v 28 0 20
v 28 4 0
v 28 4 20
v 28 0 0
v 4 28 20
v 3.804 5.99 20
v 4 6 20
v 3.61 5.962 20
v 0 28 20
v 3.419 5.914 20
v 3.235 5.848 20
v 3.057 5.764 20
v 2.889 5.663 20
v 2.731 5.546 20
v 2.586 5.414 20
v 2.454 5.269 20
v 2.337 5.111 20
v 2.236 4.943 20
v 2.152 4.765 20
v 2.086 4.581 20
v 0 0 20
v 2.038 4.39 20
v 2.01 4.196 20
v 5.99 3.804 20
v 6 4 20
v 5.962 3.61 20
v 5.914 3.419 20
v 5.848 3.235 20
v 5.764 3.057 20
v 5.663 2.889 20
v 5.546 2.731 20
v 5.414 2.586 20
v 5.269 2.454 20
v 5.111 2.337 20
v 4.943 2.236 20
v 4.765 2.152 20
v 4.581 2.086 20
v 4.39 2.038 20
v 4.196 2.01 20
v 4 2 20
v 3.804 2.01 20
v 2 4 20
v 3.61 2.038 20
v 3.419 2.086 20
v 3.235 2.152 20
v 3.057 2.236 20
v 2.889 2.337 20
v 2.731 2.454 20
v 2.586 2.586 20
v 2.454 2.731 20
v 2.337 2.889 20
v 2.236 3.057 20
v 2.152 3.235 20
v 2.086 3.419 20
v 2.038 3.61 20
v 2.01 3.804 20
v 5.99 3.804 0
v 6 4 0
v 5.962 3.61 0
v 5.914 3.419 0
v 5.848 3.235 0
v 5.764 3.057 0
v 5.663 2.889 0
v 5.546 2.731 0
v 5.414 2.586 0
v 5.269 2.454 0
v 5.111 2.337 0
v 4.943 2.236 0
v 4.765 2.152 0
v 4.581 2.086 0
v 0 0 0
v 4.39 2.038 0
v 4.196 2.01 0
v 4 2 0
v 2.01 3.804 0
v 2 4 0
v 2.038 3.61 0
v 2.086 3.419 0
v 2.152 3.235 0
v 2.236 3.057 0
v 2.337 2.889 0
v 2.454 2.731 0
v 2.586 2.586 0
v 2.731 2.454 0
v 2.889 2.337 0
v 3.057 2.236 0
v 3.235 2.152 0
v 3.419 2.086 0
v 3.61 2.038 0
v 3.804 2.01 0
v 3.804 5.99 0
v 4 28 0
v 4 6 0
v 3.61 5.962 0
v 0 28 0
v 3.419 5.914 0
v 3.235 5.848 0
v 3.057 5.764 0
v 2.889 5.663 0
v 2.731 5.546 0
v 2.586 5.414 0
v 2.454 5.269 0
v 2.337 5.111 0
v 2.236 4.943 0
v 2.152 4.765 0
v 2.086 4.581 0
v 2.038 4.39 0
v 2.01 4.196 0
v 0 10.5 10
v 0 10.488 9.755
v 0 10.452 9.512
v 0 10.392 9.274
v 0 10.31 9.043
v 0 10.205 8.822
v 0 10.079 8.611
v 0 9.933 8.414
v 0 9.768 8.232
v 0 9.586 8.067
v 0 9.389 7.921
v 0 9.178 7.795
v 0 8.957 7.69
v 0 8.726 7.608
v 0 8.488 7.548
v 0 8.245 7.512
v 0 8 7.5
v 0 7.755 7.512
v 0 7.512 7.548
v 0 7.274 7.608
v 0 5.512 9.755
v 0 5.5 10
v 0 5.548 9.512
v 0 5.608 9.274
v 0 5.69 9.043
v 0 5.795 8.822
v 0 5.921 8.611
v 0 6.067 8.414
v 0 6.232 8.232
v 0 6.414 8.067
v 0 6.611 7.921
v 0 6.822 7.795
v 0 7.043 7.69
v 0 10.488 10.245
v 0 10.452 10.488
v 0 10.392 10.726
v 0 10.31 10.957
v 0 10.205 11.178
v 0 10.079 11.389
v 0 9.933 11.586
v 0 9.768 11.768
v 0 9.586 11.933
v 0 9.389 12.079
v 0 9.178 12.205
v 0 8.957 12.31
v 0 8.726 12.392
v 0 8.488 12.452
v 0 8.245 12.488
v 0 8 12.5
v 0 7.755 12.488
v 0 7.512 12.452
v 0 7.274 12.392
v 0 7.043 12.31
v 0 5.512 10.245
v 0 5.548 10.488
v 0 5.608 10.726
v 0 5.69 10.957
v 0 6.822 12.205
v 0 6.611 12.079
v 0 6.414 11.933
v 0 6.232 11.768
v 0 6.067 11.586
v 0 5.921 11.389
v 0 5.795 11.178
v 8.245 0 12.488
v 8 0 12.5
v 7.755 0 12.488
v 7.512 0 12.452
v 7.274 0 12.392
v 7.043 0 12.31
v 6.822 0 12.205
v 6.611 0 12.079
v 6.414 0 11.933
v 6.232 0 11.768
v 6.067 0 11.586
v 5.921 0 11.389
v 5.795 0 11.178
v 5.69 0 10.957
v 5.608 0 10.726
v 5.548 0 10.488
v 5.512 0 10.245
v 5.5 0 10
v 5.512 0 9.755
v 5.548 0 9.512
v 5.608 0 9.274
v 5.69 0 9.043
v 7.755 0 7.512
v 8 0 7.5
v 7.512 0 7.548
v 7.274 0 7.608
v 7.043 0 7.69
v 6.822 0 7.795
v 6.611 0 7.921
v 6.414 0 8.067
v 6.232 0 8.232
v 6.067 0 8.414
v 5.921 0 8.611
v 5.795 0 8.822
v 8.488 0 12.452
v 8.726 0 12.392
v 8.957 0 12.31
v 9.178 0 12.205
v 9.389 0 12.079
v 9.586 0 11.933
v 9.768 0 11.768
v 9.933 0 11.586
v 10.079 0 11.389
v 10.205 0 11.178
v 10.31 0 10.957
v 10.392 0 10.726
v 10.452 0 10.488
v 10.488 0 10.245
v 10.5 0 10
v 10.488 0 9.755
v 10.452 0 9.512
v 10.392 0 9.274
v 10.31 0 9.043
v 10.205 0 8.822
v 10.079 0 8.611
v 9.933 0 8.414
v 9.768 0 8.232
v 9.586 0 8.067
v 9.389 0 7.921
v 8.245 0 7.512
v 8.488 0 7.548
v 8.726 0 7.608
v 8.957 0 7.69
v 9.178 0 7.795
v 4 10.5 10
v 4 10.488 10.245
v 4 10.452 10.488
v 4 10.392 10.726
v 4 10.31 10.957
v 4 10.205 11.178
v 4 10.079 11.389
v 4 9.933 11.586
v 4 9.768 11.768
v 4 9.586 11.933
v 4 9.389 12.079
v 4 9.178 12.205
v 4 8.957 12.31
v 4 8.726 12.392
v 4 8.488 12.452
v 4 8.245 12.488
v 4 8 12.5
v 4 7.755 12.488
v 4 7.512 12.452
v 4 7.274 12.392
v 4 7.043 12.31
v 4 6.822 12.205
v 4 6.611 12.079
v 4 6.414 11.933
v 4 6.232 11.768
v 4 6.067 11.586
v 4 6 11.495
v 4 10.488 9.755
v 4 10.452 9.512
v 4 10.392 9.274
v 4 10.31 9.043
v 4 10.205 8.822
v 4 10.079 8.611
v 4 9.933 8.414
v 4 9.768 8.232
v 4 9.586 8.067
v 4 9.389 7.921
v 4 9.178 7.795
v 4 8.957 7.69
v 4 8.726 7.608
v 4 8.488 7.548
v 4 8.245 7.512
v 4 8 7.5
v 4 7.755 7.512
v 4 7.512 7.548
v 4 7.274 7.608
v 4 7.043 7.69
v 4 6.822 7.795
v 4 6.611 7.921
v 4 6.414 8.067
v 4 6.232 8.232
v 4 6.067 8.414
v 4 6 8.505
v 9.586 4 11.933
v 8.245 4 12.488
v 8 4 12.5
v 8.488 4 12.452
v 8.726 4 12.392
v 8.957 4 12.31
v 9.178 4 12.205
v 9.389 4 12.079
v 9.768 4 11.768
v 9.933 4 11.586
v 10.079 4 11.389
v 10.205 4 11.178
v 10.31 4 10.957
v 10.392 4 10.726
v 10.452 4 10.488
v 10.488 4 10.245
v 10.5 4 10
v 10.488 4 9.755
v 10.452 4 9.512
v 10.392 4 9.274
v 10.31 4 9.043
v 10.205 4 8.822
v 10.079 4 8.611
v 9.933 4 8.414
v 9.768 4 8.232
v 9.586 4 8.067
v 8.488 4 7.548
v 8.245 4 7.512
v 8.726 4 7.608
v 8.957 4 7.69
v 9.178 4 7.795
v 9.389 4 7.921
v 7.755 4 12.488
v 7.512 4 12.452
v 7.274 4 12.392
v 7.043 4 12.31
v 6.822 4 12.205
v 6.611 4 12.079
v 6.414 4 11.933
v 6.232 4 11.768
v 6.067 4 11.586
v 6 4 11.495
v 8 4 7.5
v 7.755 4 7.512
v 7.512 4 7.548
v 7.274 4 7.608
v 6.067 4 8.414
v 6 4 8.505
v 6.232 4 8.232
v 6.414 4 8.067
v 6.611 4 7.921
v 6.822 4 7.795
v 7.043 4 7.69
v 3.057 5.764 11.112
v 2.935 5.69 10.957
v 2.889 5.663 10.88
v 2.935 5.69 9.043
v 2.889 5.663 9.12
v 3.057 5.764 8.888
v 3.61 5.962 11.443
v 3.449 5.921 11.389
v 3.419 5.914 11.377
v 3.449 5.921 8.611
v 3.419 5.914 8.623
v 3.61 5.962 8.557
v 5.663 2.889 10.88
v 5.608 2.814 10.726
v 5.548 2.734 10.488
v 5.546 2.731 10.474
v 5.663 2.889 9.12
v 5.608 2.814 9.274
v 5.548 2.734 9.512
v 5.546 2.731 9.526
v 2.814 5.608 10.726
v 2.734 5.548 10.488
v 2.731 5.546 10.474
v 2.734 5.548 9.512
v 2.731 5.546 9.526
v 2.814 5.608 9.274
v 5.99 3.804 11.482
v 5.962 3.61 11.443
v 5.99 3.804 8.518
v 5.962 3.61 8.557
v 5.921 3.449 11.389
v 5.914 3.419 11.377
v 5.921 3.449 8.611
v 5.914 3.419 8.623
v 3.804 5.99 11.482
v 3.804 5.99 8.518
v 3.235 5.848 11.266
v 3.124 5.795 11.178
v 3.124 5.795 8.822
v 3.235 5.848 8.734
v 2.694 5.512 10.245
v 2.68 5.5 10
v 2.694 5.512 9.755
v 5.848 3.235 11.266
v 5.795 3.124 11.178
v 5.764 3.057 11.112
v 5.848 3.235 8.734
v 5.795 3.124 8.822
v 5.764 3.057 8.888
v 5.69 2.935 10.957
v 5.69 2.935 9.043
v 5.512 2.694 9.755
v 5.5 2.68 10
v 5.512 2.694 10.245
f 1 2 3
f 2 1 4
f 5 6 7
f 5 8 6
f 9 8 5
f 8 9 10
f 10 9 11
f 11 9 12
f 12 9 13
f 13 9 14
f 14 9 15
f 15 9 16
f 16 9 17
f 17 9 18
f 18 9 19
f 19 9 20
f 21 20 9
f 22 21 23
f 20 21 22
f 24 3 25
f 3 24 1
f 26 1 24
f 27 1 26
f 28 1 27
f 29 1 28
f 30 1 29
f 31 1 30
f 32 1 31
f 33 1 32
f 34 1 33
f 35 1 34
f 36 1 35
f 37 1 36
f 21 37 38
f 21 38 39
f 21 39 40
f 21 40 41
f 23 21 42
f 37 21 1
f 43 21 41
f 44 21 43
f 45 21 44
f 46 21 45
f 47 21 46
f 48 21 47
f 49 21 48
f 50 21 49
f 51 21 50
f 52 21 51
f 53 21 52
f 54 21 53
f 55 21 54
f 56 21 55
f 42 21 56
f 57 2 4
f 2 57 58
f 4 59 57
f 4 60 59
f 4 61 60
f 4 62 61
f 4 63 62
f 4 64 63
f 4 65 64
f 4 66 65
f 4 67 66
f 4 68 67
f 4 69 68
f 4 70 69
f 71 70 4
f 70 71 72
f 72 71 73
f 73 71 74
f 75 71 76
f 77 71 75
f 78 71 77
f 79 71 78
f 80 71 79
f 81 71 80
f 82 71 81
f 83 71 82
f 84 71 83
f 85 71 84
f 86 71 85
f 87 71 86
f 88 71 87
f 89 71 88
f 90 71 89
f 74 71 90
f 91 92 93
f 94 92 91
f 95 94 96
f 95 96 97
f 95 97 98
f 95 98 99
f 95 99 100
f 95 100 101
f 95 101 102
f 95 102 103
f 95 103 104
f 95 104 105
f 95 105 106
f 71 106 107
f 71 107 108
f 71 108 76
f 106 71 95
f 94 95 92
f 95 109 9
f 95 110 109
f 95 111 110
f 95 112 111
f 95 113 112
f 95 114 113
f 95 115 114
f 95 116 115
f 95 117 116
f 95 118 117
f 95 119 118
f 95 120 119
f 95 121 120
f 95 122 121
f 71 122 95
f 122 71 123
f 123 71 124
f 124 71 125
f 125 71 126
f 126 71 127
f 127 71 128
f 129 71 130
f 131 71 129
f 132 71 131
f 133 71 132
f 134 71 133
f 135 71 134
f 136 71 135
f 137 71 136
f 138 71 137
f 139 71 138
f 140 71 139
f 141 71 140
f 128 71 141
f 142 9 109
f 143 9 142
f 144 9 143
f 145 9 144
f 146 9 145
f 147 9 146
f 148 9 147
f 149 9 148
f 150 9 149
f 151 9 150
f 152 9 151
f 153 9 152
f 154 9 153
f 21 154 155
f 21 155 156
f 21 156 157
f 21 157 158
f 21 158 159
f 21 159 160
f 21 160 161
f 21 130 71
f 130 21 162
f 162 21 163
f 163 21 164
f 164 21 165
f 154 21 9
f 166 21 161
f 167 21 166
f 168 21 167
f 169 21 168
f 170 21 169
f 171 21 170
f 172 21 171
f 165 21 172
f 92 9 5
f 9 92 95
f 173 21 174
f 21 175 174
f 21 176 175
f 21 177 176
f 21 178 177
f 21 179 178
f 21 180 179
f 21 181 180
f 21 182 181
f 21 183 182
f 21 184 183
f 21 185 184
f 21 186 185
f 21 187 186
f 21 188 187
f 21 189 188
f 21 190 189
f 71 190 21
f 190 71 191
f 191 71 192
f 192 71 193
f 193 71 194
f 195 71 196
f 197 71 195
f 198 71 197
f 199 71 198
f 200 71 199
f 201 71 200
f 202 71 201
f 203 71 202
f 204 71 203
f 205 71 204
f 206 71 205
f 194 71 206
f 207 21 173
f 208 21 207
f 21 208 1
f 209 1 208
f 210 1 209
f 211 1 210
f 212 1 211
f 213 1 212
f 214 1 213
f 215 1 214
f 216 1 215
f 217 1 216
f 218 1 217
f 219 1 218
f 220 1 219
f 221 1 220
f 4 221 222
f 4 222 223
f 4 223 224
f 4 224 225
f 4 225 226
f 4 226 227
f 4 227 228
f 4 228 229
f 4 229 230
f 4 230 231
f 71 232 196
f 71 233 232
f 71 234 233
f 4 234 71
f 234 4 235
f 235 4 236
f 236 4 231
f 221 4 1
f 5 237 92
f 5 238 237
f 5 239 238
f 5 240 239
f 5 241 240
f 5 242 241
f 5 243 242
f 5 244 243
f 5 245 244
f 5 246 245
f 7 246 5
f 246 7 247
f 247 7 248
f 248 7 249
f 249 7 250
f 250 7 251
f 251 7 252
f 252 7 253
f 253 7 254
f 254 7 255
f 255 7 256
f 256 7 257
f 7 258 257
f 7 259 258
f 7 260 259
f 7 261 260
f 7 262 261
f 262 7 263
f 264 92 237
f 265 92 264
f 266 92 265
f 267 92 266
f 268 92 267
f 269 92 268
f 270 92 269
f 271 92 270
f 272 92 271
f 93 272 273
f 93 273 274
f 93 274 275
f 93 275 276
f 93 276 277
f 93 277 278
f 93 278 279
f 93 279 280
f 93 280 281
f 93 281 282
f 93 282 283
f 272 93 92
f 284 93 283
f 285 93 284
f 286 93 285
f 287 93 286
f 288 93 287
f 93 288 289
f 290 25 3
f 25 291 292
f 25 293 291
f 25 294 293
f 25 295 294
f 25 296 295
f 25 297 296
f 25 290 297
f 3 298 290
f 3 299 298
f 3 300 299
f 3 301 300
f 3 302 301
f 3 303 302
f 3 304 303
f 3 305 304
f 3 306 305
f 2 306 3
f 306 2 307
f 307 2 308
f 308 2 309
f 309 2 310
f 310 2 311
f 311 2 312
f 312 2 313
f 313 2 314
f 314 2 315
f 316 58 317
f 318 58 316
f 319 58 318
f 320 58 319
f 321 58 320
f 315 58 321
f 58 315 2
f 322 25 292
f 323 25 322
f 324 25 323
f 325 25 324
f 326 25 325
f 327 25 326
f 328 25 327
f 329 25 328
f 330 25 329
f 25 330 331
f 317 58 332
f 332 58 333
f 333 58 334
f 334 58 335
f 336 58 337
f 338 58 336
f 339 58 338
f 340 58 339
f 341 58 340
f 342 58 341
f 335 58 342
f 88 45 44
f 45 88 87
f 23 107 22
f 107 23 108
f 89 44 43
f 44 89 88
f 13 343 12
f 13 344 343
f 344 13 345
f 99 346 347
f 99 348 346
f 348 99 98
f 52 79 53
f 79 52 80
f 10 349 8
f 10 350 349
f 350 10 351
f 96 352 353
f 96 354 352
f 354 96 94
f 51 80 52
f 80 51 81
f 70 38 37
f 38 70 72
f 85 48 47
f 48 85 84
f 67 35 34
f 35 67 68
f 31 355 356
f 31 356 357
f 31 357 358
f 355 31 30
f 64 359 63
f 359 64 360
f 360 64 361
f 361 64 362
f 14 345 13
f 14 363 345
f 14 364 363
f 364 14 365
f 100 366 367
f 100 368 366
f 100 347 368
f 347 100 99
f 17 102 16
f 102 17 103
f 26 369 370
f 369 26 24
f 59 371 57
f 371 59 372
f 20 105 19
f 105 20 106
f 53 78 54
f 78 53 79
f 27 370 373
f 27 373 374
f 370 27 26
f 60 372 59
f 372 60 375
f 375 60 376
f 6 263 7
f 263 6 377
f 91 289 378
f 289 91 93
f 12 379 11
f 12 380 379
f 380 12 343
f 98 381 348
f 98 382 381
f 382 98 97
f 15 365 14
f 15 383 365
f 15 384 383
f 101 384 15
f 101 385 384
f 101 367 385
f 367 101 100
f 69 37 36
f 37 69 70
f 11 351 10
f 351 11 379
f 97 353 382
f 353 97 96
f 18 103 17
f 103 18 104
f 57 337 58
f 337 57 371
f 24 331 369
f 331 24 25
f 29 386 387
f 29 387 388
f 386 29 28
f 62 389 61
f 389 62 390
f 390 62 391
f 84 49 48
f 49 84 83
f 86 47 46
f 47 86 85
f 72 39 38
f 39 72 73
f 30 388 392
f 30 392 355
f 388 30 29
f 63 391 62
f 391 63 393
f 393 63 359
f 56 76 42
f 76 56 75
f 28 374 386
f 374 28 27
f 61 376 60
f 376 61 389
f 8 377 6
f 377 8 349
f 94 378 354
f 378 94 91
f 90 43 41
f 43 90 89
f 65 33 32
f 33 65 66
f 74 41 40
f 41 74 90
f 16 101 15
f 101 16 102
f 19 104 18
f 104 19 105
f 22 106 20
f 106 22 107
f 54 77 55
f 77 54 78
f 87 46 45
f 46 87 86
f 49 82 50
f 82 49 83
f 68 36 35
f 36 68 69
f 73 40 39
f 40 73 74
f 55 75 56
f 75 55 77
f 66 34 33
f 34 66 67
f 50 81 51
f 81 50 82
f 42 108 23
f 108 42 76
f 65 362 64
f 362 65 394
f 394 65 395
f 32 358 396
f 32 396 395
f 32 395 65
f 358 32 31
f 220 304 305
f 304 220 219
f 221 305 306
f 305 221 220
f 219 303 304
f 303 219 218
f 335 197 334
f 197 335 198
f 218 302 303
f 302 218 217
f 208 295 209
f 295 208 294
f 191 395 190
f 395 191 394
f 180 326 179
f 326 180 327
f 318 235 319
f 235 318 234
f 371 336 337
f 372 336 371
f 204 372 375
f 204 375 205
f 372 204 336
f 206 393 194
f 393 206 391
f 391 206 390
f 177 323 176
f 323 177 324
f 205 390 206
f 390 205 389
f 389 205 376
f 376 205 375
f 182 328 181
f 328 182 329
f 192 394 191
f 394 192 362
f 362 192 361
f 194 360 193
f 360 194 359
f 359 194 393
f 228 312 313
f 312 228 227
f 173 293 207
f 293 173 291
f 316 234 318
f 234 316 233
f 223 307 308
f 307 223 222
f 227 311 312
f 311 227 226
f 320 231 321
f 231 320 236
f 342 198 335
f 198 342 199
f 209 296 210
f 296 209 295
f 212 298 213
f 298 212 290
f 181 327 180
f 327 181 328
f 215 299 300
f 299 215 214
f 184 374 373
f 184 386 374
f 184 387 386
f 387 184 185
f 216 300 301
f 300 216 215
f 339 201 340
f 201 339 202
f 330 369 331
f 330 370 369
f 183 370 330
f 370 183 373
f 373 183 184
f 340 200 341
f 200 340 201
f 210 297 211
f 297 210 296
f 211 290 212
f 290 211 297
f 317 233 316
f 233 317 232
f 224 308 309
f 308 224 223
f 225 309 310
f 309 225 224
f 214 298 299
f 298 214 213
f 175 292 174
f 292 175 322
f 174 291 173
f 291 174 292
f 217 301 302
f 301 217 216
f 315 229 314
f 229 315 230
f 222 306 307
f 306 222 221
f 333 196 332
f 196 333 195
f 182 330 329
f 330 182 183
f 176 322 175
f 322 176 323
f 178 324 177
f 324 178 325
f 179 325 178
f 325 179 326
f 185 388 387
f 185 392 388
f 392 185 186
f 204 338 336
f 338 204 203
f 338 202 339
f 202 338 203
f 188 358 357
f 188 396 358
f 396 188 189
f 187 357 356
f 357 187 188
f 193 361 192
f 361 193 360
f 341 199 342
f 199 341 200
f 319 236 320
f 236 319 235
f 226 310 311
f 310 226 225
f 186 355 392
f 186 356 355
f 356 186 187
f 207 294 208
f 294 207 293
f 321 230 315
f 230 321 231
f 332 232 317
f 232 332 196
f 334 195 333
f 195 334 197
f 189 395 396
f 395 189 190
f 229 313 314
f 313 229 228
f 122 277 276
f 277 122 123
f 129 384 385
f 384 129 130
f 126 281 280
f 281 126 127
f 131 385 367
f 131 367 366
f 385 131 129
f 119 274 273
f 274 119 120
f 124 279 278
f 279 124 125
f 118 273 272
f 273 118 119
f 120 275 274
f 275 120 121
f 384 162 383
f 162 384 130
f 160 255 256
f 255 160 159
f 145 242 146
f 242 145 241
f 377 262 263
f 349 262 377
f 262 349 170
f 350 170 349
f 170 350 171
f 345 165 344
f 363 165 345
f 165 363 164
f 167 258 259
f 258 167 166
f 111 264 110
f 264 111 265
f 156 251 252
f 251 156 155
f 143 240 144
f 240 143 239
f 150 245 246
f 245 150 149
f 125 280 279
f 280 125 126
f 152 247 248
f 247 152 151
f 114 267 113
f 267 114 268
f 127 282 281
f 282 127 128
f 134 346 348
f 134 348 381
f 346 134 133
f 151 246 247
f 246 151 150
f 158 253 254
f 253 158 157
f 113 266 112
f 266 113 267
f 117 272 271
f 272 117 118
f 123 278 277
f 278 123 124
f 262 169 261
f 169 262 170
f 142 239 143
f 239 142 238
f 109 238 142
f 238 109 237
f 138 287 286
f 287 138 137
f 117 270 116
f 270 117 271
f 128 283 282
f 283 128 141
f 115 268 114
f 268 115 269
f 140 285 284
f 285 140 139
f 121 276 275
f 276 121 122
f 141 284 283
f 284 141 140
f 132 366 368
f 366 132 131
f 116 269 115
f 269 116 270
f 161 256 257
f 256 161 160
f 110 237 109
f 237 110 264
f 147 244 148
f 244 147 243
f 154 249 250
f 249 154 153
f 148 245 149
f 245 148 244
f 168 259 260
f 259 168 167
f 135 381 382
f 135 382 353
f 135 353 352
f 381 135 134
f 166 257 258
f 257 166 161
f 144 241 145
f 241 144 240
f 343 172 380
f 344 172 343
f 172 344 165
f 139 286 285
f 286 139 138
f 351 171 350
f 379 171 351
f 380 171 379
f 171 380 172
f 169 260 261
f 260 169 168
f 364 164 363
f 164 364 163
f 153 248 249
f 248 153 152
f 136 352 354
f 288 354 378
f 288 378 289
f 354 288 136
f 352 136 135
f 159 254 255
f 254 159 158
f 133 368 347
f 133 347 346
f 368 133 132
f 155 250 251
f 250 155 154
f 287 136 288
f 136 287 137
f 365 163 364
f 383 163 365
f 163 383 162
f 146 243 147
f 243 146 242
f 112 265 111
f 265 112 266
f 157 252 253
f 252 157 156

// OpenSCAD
$fn = 64;

size = [28, 28, 20];   // overall bounding box
wall = 4;              // bracket wall thickness
hole_d = 5;            // mounting hole diameter
hole_edge = 8;         // distance from outer edges to hole centers
fillet_r = 2;          // inner corner relief radius

module extrusion_bracket(sz=[28,28,20], wall=4, hole_d=5, hole_edge=8, fillet_r=2) {
    x = sz[0];
    y = sz[1];
    z = sz[2];

    difference() {
        // Outer solid
        cube([x, y, z], center=false);

        // L-shaped cavity (removes one quadrant, leaving two perpendicular legs)
        translate([wall, wall, -0.1])
            cube([x - wall + 0.2, y - wall + 0.2, z + 0.2], center=false);

        // Inner corner relief (quarter-cylinder) to reduce stress
        translate([wall, wall, -0.1])
            cylinder(h = z + 0.2, r = fillet_r, center=false);

        // Mounting holes: one on each leg
        // Hole through X-leg (along Y direction)
        translate([hole_edge, wall/2, z/2])
            rotate([90, 0, 0])
                cylinder(h = wall + 0.4, d = hole_d, center=true);

        // Hole through Y-leg (along X direction)
        translate([wall/2, hole_edge, z/2])
            rotate([0, 90, 0])
                cylinder(h = wall + 0.4, d = hole_d, center=true);
    }
}

extrusion_bracket(size, wall, hole_d, hole_edge, fillet_r);
